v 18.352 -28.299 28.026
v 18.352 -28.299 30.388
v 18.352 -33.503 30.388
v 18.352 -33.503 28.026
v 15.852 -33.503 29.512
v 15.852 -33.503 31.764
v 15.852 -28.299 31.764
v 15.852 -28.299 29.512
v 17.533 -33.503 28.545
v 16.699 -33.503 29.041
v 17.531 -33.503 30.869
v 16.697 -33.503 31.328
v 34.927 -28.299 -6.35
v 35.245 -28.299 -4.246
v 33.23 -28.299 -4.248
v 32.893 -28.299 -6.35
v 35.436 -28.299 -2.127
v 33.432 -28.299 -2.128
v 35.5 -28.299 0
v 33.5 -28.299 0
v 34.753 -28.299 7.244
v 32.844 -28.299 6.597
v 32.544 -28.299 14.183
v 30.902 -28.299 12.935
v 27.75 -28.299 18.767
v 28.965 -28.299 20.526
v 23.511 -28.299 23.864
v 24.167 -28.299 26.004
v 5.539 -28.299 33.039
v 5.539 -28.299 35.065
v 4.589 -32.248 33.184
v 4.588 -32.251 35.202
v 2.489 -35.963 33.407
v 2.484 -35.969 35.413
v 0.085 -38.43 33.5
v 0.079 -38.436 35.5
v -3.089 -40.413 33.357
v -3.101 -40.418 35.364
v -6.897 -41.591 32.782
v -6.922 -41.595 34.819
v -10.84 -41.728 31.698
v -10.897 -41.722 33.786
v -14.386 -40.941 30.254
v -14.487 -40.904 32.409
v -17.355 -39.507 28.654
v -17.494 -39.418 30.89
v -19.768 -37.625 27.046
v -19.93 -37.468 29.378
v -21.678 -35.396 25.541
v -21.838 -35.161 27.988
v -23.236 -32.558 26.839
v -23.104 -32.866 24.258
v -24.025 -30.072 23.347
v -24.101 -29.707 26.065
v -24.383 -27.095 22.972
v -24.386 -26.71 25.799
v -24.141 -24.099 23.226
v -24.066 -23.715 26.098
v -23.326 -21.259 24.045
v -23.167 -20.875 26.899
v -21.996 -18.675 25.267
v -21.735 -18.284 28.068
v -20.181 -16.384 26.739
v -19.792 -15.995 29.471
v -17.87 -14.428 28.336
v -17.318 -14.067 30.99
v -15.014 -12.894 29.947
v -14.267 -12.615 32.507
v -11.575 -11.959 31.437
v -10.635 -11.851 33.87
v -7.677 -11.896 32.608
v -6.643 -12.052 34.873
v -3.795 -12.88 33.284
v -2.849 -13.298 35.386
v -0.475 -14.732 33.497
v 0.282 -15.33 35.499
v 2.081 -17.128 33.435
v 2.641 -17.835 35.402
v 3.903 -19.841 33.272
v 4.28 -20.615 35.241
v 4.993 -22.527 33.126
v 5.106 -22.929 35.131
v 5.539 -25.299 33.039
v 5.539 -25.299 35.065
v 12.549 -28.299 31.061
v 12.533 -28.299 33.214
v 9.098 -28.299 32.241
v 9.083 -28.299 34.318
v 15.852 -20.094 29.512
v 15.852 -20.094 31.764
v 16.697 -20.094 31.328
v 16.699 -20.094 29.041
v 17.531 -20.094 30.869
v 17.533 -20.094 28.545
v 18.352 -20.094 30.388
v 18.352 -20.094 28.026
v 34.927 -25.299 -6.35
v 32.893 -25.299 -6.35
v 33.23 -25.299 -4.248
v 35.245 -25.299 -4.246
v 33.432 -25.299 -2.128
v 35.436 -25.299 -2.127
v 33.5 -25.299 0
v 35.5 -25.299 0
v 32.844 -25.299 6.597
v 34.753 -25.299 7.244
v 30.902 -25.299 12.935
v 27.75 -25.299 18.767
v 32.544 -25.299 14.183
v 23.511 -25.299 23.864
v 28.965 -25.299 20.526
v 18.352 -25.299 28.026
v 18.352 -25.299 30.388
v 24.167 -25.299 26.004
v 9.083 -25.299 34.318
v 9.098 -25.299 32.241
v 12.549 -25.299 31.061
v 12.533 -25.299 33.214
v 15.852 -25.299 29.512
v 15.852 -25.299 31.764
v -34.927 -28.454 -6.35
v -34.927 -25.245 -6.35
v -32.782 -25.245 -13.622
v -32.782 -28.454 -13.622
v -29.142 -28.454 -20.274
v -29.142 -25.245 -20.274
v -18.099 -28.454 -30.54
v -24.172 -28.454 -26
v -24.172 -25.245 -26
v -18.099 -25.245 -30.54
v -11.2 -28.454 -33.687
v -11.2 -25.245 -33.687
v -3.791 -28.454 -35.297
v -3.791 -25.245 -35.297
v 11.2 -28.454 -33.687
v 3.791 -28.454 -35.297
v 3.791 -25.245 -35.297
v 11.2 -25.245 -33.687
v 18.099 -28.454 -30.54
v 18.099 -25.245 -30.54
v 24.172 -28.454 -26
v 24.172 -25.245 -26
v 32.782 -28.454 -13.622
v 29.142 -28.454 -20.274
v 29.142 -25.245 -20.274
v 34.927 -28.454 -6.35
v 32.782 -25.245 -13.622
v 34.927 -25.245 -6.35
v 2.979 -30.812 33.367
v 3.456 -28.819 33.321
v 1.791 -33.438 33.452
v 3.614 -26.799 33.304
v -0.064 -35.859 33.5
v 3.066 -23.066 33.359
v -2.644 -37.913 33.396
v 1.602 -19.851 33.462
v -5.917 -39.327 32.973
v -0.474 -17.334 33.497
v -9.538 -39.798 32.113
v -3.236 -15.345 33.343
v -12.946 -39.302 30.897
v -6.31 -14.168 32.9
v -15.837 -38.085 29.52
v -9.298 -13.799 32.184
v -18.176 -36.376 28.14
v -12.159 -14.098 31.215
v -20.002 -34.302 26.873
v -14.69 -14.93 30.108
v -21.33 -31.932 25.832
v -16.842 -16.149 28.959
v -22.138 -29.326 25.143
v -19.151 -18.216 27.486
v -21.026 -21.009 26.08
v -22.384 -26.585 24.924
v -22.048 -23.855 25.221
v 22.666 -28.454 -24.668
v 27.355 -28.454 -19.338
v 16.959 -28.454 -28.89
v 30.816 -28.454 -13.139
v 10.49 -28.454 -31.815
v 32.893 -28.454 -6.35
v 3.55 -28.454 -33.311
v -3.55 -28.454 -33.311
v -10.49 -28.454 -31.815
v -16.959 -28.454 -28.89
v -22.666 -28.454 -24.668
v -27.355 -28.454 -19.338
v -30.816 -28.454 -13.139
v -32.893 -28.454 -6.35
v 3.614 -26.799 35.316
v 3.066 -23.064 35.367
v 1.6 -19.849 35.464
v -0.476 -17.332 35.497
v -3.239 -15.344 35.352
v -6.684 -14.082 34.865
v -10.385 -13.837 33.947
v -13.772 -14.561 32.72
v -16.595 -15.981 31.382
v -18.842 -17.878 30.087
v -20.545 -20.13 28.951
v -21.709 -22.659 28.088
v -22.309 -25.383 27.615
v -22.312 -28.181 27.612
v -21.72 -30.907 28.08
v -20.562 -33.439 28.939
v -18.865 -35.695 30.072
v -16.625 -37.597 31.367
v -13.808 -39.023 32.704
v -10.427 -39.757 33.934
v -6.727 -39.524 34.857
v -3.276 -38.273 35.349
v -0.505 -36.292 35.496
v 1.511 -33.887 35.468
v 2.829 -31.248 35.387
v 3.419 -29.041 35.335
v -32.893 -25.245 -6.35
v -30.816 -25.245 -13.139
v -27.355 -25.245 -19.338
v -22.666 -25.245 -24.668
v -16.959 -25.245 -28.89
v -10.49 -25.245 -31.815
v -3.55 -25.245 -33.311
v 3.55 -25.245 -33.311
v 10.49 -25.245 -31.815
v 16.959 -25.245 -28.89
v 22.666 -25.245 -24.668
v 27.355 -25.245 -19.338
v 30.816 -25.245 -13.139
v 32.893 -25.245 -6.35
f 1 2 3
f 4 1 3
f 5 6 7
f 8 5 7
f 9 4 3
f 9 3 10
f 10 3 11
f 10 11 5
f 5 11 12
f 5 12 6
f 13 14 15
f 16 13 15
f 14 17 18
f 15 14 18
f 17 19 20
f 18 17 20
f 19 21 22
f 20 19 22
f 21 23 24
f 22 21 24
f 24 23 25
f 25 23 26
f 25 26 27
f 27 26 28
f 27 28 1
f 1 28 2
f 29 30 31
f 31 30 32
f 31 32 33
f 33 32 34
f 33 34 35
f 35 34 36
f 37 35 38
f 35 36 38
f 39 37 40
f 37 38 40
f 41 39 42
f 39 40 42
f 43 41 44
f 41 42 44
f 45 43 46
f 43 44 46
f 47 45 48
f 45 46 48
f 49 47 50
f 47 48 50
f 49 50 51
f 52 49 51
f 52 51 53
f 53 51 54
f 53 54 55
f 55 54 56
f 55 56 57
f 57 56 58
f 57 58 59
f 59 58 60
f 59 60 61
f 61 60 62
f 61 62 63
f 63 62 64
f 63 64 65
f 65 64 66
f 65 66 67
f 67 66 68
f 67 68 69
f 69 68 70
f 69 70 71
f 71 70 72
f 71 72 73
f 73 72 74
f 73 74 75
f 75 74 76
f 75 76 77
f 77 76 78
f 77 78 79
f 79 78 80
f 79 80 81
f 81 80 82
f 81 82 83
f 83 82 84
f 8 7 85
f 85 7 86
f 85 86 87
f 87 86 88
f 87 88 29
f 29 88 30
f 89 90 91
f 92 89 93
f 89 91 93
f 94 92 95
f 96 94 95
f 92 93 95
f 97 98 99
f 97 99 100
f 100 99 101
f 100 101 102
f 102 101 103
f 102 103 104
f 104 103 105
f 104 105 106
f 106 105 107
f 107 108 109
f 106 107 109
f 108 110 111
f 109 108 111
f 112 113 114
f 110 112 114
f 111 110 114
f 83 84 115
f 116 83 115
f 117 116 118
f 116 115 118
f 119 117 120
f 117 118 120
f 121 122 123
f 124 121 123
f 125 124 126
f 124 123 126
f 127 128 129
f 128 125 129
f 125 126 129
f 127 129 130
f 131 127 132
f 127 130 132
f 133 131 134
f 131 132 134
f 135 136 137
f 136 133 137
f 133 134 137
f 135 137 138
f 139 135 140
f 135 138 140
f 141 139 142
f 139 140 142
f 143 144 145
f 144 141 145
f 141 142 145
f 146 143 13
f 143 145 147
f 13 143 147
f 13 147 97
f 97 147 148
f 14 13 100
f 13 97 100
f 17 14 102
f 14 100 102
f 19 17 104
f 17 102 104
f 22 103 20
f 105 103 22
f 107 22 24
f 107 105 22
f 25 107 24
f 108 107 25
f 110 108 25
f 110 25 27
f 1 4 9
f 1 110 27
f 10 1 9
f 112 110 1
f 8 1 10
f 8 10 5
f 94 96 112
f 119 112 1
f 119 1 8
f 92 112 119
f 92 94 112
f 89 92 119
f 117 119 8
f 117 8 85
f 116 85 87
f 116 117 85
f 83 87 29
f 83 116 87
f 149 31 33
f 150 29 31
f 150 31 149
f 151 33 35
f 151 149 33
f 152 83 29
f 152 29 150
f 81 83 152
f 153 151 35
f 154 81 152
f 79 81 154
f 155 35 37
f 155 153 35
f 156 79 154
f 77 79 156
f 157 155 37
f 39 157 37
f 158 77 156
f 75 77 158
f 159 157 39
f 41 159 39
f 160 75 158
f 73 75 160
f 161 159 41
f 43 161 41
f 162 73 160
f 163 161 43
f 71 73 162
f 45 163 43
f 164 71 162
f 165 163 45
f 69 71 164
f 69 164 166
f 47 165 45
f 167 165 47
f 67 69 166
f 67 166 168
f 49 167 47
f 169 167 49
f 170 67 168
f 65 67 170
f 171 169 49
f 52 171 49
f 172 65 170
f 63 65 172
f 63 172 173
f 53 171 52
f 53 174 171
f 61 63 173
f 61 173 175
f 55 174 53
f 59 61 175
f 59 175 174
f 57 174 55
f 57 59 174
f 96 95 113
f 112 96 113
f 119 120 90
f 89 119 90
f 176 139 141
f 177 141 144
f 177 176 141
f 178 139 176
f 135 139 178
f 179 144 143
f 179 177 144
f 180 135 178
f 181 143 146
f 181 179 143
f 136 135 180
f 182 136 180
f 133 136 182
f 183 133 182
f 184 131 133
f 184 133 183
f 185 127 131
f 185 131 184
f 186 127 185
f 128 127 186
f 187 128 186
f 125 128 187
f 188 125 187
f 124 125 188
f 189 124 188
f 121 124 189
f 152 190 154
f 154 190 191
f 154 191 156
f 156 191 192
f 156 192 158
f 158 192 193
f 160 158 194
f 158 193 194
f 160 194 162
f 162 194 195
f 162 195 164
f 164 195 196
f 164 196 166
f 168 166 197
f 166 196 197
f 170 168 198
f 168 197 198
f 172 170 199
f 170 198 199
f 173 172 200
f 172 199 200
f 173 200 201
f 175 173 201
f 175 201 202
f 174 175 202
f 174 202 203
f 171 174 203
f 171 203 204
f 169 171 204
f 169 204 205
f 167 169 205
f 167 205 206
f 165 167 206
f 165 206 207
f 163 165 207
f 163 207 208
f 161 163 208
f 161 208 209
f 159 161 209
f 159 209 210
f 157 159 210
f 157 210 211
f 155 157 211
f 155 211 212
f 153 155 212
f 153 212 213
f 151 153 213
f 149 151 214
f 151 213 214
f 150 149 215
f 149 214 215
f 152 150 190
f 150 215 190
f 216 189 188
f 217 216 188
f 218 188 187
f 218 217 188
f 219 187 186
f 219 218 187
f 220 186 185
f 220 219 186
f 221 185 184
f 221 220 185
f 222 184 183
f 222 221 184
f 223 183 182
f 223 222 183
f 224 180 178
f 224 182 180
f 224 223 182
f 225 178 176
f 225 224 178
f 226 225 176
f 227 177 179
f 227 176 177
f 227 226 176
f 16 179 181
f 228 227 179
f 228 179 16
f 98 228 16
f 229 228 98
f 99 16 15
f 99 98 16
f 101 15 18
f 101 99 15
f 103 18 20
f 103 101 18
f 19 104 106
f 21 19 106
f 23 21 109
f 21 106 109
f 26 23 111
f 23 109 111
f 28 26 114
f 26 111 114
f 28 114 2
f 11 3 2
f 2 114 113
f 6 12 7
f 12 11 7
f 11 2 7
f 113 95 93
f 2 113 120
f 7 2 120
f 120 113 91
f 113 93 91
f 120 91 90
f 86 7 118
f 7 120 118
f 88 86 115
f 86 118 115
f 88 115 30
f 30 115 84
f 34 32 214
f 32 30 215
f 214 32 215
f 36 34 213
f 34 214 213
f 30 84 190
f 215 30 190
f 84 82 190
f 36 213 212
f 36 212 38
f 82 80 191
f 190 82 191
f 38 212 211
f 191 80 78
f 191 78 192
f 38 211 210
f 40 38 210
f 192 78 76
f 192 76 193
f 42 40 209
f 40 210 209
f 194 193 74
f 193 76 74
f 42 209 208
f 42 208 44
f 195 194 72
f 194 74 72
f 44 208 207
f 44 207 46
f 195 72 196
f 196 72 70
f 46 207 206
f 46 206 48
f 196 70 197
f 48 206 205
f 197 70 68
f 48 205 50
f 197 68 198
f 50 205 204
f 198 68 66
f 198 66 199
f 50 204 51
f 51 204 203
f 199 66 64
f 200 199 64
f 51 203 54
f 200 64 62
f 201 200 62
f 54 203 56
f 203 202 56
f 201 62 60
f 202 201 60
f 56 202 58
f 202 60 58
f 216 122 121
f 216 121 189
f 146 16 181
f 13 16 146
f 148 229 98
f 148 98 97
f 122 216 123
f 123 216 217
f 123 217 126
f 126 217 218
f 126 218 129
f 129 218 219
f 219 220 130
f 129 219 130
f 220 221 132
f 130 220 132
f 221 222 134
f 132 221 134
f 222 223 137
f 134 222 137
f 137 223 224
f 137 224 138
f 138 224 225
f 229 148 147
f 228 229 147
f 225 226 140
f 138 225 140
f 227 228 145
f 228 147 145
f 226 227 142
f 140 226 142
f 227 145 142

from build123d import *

# Parameters (mm, degrees)
F0_R     = 35.5
F0_R_2   = 33.5
F1_DEPTH = 50.8
F3_R     = 13
F4_DEPTH = 44.45
F6_DEPTH = 38.1


with BuildPart() as f1:
    # F0 (on Front) → F1 (new body)
    with BuildSketch(Plane.XZ):
        Circle(F0_R)
        Circle(F0_R_2, mode=Mode.SUBTRACT)
    extrude(amount=F1_DEPTH)

    # F3 (on offset) → F4 (cut)
    with BuildSketch(Plane.XY.offset(38.1)):
        with BuildLine():
            ThreePointArc((5.538755, -28.298548), (-24.386056, -26.798548), (5.538755, -25.298548))
            Line((5.538755, -25.298548), (15.851872, -25.298548))
            Line((15.851872, -25.298548), (15.851872, -20.093698))
            Line((15.851872, -20.093698), (18.351872, -20.093698))
            Line((18.351872, -20.093698), (18.351872, -25.298548))
            Line((18.351872, -25.298548), (35.634305, -25.298548))
            Line((35.634305, -25.298548), (35.634305, 3.781537))
            Line((35.634305, 3.781537), (-42.059839, 3.781537))
            Line((-42.059839, 3.781537), (-40.54736, -55.053797))
            Line((-40.54736, -55.053797), (35.634305, -53.095396))
            Line((35.634305, -53.095396), (35.634305, -28.298548))
            Line((35.634305, -28.298548), (18.351872, -28.298548))
            Line((18.351872, -28.298548), (18.351872, -33.503398))
            Line((18.351872, -33.503398), (15.851872, -33.503398))
            Line((15.851872, -33.503398), (15.851872, -28.298548))
            Line((15.851872, -28.298548), (5.538755, -28.298548))
        make_face()
        with Locations((-9.386056, -26.798548)):
            Circle(F3_R)
    extrude(amount=-F4_DEPTH, mode=Mode.SUBTRACT)

    # F5 (on Right) → F6 (cut, symmetric)
    with BuildSketch(Plane.YZ):
        Polygon((-28.453713, -37.598766), (-28.453713, -6.049039), (-52.303165, -5.728194), (-52.303165, -37.598766), align=None)
        Polygon((4.118928, -6.049039), (-25.245266, -6.049039), (-25.245266, -37.270404), (5.401779, -37.682697), align=None)
    extrude(amount=F6_DEPTH, both=True, mode=Mode.SUBTRACT)


solid = f1.part
